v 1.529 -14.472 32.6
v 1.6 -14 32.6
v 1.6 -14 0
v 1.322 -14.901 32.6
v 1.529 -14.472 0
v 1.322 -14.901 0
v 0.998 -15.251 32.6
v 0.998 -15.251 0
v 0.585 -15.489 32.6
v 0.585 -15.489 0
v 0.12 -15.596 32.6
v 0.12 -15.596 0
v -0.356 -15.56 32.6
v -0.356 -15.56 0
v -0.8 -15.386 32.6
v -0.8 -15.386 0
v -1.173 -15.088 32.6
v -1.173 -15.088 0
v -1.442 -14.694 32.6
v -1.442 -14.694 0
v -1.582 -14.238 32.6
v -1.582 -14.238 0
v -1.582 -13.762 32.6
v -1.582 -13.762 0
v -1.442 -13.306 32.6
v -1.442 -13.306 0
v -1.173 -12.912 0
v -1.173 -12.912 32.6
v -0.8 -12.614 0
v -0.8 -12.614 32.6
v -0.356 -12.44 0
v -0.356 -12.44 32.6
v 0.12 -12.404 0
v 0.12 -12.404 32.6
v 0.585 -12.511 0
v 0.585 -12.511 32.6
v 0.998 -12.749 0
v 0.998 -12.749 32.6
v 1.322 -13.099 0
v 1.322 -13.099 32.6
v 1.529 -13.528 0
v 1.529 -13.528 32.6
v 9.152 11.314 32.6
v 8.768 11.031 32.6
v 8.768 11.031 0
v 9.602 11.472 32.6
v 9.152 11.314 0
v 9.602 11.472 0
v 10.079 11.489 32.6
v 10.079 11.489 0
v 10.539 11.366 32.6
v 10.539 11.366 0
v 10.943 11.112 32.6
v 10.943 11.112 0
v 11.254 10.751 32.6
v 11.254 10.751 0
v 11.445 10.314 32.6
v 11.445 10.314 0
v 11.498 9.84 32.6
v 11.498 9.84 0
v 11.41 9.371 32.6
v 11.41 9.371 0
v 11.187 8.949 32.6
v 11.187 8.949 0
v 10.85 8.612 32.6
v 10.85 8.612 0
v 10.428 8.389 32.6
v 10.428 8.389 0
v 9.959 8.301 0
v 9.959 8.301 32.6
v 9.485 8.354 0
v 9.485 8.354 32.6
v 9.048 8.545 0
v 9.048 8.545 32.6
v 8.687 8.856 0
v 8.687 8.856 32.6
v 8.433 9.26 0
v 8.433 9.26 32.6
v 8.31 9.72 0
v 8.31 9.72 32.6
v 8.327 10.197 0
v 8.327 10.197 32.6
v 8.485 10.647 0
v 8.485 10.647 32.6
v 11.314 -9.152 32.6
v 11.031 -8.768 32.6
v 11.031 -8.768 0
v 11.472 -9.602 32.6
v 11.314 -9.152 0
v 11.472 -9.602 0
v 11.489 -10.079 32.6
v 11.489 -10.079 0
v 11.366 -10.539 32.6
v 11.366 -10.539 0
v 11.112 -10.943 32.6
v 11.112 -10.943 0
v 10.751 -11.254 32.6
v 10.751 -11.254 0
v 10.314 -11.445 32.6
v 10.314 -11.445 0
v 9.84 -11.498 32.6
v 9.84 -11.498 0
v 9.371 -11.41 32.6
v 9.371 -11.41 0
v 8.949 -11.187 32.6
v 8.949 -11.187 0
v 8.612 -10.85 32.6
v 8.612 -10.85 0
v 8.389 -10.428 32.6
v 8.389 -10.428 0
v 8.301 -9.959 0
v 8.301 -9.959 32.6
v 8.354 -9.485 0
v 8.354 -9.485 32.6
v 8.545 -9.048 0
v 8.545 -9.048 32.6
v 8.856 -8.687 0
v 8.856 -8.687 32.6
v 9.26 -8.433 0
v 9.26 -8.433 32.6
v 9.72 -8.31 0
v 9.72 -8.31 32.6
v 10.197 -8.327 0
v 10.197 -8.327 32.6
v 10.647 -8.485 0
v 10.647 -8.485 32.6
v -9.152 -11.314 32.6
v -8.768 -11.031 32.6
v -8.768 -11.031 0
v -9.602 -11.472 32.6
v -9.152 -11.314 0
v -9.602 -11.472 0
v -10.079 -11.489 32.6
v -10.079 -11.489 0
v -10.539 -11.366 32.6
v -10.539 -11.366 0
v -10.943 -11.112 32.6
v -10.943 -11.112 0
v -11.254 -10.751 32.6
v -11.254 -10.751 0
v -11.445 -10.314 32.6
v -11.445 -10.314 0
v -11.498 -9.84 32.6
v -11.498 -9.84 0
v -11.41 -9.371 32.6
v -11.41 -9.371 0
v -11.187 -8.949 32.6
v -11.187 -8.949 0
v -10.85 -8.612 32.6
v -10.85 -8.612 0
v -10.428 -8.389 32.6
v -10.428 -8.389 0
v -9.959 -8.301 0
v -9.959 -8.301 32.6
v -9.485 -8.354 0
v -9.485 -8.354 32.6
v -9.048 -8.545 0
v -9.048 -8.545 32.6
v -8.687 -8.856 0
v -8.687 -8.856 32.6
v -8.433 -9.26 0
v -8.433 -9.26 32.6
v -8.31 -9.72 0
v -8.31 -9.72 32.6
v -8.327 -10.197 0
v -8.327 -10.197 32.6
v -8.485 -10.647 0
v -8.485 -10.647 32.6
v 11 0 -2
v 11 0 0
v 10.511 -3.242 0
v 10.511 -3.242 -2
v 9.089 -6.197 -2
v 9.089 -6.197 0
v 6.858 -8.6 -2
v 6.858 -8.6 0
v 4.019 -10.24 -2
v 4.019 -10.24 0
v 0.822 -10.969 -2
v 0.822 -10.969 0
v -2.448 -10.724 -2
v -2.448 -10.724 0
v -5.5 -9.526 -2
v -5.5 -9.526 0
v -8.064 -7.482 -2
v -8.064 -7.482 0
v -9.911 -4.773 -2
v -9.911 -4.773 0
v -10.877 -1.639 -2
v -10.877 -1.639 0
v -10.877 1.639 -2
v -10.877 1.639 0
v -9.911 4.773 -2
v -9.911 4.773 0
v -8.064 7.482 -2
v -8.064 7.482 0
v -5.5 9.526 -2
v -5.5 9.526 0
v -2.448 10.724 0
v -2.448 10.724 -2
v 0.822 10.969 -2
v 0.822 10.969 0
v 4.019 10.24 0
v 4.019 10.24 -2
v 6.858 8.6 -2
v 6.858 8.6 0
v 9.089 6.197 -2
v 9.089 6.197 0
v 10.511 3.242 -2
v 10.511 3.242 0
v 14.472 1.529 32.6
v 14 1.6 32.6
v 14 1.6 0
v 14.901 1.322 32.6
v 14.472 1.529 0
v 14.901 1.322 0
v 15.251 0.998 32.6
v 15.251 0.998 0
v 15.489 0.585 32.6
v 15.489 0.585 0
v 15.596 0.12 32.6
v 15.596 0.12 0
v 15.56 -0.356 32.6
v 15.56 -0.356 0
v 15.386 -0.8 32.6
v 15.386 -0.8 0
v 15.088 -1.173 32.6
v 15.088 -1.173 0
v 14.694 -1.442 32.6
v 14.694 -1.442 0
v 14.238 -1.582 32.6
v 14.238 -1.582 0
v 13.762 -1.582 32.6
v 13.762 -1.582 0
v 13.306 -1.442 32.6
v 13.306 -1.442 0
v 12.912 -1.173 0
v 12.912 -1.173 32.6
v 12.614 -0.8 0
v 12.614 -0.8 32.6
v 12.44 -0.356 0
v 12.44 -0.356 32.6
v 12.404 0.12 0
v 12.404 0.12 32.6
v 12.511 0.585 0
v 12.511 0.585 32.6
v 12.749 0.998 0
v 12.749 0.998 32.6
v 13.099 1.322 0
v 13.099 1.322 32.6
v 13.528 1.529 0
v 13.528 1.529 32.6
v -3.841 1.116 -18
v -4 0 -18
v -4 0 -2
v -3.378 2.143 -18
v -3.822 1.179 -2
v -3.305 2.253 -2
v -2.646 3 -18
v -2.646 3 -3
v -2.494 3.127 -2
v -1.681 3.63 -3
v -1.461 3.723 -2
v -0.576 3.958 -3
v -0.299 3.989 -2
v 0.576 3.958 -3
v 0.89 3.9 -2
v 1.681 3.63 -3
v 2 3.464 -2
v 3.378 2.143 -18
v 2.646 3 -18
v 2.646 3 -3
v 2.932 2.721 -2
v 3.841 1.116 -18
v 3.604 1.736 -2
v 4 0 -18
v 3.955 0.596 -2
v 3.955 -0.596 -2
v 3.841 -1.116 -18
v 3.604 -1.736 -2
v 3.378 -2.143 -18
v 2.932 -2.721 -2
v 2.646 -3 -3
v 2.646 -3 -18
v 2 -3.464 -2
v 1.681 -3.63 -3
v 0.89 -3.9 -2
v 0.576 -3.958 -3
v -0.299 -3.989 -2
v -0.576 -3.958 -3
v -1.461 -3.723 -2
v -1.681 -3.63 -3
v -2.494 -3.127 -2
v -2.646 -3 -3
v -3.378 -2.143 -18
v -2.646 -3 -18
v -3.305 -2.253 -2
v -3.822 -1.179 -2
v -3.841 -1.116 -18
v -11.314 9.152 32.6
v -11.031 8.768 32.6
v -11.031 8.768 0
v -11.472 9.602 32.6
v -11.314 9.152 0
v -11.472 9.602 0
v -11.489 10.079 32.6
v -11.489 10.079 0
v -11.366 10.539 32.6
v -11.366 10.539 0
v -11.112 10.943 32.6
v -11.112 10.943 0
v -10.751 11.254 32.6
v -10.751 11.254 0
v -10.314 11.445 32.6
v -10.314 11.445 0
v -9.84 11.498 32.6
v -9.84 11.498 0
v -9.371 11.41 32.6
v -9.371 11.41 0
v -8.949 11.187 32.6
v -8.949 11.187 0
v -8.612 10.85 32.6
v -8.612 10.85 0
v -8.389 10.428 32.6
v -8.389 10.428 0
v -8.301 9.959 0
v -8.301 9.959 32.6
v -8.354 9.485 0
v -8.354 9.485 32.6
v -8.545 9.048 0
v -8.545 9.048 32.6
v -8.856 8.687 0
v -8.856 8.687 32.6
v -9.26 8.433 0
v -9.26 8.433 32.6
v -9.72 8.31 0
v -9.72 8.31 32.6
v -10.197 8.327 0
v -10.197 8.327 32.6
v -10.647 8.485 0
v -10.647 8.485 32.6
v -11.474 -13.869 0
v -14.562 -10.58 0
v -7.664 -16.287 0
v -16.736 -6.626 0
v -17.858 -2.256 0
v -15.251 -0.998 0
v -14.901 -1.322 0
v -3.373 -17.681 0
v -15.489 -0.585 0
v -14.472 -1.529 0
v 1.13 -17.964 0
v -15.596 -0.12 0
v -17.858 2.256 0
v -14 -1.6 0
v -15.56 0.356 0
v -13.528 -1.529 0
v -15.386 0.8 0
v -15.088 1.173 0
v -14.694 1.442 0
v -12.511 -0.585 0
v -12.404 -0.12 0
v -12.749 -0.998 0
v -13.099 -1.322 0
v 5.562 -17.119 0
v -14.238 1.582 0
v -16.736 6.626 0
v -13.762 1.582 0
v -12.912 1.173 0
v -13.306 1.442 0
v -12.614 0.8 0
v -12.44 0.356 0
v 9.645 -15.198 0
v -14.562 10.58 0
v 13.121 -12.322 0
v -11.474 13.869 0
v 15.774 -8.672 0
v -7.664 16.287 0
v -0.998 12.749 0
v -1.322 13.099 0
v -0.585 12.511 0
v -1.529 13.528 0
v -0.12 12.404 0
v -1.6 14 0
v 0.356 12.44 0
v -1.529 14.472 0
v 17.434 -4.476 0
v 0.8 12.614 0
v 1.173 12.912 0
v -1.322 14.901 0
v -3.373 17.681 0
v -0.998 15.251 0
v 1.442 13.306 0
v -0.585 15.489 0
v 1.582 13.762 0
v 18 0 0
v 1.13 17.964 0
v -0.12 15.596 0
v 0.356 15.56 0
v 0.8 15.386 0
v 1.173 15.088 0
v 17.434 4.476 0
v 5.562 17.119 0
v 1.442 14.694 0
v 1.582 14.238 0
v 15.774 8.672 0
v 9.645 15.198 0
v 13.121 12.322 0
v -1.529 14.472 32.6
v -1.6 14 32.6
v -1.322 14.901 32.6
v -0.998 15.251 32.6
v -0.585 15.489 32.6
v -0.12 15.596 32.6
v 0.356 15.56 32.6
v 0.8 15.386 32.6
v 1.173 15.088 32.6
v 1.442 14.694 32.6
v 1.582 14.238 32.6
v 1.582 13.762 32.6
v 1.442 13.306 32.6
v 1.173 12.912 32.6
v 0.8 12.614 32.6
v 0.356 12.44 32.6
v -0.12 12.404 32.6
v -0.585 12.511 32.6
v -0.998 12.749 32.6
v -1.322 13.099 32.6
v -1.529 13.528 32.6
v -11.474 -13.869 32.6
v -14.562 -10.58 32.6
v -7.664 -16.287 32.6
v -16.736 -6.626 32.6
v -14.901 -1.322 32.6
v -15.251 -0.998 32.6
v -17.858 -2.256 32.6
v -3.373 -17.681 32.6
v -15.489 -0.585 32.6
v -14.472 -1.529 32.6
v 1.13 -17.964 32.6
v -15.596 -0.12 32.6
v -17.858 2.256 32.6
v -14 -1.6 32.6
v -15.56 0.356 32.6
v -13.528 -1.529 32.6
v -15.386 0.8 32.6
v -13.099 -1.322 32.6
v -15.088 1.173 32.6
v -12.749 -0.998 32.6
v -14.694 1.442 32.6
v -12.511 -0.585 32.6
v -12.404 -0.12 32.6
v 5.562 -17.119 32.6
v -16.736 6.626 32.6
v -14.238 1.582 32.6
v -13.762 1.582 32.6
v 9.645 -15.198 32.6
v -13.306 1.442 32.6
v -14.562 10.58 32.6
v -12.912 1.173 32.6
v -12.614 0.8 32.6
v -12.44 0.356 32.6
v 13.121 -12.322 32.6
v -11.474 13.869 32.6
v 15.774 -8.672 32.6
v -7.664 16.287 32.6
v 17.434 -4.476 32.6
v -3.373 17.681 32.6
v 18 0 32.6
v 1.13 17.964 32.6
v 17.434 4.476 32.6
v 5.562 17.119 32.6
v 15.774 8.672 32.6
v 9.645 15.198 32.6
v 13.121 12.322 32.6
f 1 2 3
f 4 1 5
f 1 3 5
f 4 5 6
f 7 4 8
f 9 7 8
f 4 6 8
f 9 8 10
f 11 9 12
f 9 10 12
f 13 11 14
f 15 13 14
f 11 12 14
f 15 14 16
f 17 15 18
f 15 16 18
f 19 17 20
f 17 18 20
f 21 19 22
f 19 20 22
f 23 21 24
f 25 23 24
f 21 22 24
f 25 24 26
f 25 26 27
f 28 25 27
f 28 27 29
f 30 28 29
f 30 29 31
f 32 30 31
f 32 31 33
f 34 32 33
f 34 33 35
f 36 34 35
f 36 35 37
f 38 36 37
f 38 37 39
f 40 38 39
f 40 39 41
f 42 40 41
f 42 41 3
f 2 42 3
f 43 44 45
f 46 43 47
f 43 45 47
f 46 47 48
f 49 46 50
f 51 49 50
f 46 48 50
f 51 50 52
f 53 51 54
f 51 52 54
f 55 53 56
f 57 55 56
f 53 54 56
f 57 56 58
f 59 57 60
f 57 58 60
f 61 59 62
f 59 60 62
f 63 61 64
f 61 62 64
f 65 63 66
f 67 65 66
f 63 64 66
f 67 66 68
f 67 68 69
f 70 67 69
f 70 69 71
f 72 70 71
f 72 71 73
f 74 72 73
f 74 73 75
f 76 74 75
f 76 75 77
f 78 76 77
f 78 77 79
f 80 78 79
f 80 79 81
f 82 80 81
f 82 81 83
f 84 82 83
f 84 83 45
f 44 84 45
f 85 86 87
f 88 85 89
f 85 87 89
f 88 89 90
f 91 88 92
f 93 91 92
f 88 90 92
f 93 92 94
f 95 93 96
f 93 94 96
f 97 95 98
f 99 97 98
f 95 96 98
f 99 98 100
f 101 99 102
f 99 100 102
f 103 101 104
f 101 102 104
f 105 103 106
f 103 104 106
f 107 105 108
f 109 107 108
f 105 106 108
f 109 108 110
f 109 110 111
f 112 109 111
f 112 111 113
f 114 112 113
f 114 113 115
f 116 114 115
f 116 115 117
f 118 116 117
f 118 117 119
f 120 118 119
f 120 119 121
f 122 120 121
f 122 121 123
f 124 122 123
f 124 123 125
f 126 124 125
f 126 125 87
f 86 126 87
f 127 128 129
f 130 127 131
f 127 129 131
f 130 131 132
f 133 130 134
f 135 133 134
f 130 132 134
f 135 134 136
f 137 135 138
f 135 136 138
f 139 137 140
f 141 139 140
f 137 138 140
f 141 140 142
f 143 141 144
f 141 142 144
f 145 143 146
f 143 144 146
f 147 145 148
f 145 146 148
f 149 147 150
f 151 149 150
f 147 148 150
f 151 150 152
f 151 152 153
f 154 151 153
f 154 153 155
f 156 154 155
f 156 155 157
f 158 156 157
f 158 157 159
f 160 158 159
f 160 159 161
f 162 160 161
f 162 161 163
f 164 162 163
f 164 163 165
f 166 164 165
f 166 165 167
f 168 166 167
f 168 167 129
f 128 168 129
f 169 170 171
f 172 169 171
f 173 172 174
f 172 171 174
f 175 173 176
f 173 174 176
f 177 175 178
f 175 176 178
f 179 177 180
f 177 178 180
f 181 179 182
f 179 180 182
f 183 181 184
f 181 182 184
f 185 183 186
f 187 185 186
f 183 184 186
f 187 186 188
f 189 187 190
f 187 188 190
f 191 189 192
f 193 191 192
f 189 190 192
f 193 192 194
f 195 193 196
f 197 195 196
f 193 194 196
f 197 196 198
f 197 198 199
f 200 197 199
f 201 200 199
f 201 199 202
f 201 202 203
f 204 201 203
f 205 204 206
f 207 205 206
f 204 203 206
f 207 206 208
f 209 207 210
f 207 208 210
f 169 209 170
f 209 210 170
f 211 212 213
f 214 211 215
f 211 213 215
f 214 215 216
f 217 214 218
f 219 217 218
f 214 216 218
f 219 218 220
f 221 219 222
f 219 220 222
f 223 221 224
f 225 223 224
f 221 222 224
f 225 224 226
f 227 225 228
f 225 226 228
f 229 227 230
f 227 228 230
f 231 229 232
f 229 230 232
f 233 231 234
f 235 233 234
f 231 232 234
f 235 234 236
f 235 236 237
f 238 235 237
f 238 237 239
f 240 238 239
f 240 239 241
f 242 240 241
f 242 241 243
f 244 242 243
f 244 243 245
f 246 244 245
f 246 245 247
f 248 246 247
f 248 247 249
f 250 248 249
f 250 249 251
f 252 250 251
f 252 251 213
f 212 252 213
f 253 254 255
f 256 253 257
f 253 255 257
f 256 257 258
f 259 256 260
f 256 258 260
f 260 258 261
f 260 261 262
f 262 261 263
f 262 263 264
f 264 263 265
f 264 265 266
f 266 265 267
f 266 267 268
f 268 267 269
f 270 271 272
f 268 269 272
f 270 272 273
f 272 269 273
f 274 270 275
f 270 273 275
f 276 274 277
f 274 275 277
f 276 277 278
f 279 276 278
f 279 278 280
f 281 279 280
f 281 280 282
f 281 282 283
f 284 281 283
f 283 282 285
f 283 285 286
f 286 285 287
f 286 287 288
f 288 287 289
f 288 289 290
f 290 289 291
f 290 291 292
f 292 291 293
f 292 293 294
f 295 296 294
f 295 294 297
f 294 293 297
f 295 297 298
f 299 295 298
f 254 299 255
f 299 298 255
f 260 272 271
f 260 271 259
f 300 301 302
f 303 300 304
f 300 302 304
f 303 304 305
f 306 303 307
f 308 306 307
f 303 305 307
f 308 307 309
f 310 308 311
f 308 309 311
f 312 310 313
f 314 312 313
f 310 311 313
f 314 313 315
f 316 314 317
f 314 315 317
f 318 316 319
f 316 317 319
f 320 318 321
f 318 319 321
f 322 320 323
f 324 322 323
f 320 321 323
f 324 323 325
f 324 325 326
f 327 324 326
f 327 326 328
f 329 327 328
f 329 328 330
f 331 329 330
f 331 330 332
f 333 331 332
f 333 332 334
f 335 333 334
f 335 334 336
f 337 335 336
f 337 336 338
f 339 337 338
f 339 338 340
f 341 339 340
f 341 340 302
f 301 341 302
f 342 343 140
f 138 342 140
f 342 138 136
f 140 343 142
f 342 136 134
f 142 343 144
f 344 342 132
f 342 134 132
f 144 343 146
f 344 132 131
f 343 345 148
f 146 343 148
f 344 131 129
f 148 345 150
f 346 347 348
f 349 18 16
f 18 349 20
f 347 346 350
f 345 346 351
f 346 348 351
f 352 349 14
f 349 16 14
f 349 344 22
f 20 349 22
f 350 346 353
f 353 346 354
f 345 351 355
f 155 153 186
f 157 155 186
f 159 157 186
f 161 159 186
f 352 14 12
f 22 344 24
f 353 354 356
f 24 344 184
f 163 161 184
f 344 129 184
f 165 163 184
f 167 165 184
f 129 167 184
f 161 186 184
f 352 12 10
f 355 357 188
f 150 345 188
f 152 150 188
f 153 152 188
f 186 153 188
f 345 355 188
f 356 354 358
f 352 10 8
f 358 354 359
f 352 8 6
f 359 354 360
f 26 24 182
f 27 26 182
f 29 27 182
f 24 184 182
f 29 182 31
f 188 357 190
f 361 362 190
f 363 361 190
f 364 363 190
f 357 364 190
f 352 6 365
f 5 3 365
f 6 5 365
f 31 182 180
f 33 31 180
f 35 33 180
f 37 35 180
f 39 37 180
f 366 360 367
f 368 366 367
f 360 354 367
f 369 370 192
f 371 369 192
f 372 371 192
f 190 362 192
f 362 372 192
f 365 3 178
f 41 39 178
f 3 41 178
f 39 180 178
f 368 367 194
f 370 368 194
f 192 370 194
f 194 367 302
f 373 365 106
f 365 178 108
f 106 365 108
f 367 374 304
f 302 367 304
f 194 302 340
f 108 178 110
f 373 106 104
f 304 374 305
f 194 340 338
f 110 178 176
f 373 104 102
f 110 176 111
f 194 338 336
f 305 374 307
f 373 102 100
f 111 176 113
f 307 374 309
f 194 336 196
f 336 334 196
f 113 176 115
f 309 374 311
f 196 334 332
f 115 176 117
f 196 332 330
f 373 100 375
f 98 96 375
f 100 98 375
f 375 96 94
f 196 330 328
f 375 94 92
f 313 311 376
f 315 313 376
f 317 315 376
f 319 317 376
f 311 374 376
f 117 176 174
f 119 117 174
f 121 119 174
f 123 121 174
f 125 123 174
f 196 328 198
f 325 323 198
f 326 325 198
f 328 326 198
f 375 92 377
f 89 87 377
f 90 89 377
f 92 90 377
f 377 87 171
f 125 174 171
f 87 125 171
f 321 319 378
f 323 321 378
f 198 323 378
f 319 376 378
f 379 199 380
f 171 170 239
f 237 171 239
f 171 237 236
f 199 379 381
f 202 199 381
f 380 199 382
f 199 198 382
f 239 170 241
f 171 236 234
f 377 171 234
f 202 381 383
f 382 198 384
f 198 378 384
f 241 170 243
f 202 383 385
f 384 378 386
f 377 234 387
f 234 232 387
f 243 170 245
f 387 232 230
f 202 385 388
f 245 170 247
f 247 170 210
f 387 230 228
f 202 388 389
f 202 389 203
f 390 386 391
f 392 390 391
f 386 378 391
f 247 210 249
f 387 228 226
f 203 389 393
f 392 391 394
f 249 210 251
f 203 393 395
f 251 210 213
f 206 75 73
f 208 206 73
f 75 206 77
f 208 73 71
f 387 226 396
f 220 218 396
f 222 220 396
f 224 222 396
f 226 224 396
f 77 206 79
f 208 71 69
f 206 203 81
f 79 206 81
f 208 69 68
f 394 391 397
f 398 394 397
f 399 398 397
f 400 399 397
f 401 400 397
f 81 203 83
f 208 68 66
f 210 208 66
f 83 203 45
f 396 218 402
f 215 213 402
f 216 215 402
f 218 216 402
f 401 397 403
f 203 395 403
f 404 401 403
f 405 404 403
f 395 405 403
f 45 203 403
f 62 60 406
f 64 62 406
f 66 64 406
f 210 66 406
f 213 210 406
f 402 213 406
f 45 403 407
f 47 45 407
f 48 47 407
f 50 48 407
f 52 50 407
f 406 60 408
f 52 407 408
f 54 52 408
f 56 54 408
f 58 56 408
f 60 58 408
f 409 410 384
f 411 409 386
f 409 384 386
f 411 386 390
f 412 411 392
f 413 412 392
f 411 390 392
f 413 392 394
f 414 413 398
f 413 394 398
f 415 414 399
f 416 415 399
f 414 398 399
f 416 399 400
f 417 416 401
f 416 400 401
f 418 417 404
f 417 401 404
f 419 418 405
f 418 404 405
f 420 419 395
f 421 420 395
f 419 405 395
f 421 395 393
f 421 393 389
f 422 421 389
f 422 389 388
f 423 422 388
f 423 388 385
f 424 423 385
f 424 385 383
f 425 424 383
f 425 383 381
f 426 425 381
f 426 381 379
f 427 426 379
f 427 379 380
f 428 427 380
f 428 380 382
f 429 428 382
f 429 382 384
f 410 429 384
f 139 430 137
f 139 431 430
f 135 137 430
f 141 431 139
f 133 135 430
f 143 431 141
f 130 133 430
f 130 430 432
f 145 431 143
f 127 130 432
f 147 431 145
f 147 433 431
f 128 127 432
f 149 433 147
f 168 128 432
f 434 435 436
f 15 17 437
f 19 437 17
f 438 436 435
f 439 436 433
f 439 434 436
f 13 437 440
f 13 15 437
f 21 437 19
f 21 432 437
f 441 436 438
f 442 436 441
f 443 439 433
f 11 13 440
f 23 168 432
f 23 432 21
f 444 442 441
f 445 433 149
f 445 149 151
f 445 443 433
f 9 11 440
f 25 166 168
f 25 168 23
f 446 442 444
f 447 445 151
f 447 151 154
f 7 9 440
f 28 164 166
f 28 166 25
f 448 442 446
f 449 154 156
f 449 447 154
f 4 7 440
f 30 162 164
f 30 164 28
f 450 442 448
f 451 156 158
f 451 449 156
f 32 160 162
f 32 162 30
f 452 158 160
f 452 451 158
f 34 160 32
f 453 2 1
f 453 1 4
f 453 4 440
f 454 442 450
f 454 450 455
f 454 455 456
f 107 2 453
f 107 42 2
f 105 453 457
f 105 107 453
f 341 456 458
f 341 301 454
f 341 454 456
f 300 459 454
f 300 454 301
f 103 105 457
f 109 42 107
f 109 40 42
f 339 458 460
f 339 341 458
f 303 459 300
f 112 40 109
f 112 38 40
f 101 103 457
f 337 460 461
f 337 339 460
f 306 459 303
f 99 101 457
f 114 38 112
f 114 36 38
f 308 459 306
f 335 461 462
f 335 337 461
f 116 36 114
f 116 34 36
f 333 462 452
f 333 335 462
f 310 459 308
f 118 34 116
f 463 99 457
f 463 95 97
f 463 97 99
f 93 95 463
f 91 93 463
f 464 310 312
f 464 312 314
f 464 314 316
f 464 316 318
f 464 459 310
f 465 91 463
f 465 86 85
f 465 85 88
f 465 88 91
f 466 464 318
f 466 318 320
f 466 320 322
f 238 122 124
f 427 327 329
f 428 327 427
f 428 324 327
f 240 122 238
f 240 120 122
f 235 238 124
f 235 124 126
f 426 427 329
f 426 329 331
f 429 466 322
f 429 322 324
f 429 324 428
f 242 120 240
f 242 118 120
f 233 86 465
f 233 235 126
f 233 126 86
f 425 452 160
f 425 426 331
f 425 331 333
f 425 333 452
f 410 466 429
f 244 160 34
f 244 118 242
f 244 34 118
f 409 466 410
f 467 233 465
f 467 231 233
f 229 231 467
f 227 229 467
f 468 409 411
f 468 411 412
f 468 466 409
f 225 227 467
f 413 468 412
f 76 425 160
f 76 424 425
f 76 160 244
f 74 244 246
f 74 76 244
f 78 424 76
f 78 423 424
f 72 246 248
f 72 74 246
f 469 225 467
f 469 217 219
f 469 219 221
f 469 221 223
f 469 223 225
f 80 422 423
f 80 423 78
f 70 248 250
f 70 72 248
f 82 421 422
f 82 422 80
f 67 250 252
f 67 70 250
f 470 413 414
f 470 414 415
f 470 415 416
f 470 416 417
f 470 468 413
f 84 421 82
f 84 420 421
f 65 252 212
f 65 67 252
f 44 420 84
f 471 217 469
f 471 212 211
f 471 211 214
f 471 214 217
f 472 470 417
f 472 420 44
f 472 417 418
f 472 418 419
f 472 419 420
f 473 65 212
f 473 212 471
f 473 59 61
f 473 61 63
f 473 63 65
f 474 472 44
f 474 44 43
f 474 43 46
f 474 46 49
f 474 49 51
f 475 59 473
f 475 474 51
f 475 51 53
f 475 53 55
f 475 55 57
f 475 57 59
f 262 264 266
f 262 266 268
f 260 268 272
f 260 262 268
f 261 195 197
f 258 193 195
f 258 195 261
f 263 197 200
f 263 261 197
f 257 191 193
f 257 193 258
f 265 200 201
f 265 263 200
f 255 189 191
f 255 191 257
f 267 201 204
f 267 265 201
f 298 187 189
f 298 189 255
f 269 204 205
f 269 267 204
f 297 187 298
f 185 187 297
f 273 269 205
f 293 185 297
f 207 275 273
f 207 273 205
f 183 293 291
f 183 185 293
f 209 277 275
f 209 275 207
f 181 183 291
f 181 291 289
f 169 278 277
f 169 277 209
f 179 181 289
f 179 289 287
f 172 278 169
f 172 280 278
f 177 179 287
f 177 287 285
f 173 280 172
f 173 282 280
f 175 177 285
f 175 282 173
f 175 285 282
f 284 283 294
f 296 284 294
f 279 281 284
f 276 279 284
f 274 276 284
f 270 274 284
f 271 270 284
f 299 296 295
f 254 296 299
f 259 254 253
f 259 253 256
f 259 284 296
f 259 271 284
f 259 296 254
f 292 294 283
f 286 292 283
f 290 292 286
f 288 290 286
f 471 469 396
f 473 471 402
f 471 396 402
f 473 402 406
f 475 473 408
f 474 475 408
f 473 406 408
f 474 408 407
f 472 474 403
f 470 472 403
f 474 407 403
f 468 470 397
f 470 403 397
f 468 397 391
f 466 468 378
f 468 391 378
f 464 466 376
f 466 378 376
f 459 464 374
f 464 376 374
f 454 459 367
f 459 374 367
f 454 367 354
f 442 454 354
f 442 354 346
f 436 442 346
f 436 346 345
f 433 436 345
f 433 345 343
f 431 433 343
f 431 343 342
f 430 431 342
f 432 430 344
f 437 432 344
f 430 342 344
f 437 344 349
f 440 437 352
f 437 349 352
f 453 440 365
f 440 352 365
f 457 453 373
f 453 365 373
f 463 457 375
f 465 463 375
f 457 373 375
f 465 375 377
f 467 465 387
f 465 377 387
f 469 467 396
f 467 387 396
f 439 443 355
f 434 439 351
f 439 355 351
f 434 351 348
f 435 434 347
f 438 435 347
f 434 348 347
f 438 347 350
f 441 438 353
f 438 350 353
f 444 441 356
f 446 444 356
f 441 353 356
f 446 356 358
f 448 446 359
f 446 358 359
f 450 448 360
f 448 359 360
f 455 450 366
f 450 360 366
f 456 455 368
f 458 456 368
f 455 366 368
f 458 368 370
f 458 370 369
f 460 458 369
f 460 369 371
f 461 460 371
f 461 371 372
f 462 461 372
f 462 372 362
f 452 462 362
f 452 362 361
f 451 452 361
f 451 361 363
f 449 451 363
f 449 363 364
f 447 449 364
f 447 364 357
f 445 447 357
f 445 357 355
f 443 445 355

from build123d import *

# Parameters (mm, degrees)
SKETCH1_R           = 18
BOSS_EXTRUDE1_DEPTH = 32.6
SKETCH2_R           = 1.6
CUT_EXTRUDE1_DEPTH  = 42.361334601
CIRPATTERN1_COUNT   = 8
SKETCH3_R           = 11
BOSS_EXTRUDE2_DEPTH = 2
SKETCH4_R           = 4
BOSS_EXTRUDE3_DEPTH = 16
CUT_EXTRUDE2_START  = -15
CUT_EXTRUDE2_DEPTH  = 15


with BuildPart() as part:
    # Sketch1 → Boss-Extrude1 (new body)
    with BuildSketch(Plane.XY):
        Circle(SKETCH1_R)
    extrude(amount=BOSS_EXTRUDE1_DEPTH)

    # Sketch2 → Cut-Extrude1 (cut, through all)
    with BuildSketch(Plane(origin=(0, 0, 0), x_dir=(-1, 0, 0), z_dir=(0, 0, -1))):
        with Locations((0, 14)):
            Circle(SKETCH2_R)
    cut_extrude1 = extrude(amount=-CUT_EXTRUDE1_DEPTH, mode=Mode.SUBTRACT)

    # CirPattern1: Cut-Extrude1 ×8 about axis
    cirpattern1_axis = Axis((0, 0, 0), (0, 0, 1))
    for i in range(1, CIRPATTERN1_COUNT):
        add(cut_extrude1.rotate(cirpattern1_axis, i * 360 / CIRPATTERN1_COUNT), mode=Mode.SUBTRACT)

    # Sketch3 → Boss-Extrude2 (add)
    with BuildSketch(Plane(origin=(0, 0, 0), x_dir=(-1, 0, 0), z_dir=(0, 0, -1))):
        with Locations(Location((0, 0, 0), (0, 0, 180))):
            Circle(SKETCH3_R)
    extrude(amount=BOSS_EXTRUDE2_DEPTH)

    # Sketch4 → Boss-Extrude3 (add)
    with BuildSketch(Plane(origin=(0, 0, -2), x_dir=(-1, 0, 0), z_dir=(0, 0, -1))):
        Circle(SKETCH4_R)
    extrude(amount=BOSS_EXTRUDE3_DEPTH)

    # Sketch5 → Cut-Extrude2 (cut)
    with BuildSketch(Plane(origin=(0, 0, -18), x_dir=(-1, 0, 0), z_dir=(0, 0, -1)).offset(CUT_EXTRUDE2_START)):
        with BuildLine():
            Line((-2.645751311, 3), (2.645751311, 3))
            ThreePointArc((2.645751311, 3), (0, 4), (-2.645751311, 3))
        make_face()
        with BuildLine():
            Line((-2.645751311, -3), (2.645751311, -3))
            ThreePointArc((2.645751311, -3), (0, -4), (-2.645751311, -3))
        make_face()
    extrude(amount=CUT_EXTRUDE2_DEPTH, mode=Mode.SUBTRACT)


solid = part.part
